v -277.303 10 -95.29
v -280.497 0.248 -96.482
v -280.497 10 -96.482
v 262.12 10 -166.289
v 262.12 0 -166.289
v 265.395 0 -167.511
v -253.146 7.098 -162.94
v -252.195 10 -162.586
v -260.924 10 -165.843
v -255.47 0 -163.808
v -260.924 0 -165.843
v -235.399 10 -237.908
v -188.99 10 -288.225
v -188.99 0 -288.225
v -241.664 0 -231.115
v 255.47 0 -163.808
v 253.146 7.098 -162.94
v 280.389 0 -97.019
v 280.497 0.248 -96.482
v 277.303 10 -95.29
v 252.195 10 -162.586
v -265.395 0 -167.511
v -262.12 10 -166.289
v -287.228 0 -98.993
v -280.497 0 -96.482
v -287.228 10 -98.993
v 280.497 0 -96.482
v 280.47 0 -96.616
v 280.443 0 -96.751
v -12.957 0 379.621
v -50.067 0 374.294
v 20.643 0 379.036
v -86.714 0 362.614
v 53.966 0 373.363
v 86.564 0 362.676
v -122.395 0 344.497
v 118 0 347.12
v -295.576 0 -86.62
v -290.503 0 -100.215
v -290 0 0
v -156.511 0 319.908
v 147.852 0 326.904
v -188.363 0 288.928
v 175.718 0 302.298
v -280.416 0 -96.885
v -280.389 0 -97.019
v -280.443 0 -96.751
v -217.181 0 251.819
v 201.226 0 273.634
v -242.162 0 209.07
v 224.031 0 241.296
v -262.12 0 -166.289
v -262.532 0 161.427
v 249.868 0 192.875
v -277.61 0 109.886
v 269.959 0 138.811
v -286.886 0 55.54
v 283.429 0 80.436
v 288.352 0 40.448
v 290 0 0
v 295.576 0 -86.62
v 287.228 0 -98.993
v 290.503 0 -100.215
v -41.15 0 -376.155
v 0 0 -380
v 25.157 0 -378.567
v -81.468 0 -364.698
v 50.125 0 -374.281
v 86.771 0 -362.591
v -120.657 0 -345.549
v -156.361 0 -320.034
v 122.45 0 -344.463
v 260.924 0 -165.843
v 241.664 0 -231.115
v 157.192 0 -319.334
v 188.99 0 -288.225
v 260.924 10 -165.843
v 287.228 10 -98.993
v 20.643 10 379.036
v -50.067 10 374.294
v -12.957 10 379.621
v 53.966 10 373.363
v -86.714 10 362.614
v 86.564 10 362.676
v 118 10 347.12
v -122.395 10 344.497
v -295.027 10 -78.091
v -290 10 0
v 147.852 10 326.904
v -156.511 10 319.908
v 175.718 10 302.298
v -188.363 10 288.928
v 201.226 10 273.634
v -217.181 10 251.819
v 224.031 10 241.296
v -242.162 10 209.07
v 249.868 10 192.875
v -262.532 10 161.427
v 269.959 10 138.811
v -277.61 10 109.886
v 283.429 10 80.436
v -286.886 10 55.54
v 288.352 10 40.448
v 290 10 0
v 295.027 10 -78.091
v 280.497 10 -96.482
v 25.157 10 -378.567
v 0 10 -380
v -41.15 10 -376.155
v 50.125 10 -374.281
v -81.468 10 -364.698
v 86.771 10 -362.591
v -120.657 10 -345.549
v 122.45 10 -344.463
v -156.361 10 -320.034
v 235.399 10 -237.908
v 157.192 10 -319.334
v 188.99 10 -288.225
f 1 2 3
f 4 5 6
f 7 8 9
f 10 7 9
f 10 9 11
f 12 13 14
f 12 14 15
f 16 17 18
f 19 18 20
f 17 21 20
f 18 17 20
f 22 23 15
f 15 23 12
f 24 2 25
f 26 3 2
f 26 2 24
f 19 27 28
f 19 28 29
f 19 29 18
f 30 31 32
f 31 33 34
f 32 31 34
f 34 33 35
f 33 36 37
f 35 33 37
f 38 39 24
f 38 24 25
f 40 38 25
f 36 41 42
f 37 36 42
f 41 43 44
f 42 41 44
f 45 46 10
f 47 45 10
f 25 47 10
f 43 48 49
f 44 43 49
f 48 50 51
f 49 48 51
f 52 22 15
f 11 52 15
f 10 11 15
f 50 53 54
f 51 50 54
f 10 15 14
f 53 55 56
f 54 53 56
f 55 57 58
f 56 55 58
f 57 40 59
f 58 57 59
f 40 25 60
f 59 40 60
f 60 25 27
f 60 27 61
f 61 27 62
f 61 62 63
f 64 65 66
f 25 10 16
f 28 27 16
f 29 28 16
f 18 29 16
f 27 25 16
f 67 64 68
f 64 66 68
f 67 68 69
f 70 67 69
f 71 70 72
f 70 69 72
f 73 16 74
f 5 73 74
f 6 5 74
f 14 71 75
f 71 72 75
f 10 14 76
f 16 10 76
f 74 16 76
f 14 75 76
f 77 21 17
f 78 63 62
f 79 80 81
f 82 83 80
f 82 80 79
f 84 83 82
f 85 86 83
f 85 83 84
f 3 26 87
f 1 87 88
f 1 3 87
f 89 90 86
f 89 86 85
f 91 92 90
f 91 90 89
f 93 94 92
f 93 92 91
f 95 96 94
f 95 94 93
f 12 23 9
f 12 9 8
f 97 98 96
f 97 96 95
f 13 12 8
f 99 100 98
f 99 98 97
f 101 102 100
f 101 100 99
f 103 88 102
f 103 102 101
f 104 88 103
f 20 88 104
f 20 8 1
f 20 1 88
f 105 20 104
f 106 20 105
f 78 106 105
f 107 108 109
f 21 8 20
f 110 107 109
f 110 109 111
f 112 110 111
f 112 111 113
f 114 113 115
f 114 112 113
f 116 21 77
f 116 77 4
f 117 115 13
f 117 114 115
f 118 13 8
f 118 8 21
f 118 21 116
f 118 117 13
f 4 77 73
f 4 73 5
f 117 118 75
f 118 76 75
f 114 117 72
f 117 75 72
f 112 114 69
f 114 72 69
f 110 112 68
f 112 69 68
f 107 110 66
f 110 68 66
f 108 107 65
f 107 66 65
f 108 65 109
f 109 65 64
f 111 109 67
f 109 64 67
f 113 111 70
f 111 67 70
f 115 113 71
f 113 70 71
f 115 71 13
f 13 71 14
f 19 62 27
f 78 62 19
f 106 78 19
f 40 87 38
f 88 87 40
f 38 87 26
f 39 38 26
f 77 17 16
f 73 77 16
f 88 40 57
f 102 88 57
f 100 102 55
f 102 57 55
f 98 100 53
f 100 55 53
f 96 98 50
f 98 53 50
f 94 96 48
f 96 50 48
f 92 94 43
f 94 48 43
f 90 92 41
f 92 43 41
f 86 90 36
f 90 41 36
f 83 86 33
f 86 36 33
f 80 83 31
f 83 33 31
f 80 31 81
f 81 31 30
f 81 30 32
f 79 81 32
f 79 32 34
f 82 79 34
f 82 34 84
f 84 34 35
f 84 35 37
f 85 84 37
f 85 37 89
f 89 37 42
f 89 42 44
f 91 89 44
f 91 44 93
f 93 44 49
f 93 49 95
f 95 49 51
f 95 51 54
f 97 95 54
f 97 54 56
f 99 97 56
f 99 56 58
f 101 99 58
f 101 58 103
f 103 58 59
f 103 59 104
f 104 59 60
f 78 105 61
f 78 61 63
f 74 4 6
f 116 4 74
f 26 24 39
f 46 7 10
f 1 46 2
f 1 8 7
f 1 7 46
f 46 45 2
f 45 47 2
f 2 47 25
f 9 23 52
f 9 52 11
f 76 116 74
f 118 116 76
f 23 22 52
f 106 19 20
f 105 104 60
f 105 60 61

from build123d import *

# Parameters (mm, degrees)
SKETCH1_RX          = 380
SKETCH1_RY          = 290
BOSS_EXTRUDE1_DEPTH = 10
BOSS_EXTRUDE2_DEPTH = 10
CUT_EXTRUDE1_DEPTH  = 10
SKETCH8_W           = 355.795250099
SKETCH8_H           = 262.515596516
CUT_EXTRUDE2_DEPTH  = 102.013832803


with BuildPart() as part:
    # Sketch1 → Boss-Extrude1 (new body)
    with BuildSketch(Plane(origin=(0, 0, 0), x_dir=(1, 0, 0), z_dir=(0, 1, 0))):
        with Locations(Location((0, 0), (0, 0, 90))):
            Ellipse(SKETCH1_RX, SKETCH1_RY)
    extrude(amount=BOSS_EXTRUDE1_DEPTH)

    # Sketch2 → Boss-Extrude2 (add)
    with BuildSketch(Plane(origin=(0, 10, 0), x_dir=(1, 0, 0), z_dir=(0, 1, 0))):
        Polygon((287.228032818, 98.993347022), (277.229646496, 95.262936552), (290, 0), (296.597160239, 102.488980208), align=None)
        Polygon((-296.597160239, 102.488980208), (-290, 0), (-277.229646496, 95.262936552), (-287.228032818, 98.993347022), align=None)
        Polygon((244.797124663, 227.718261487), (188.989530622, 288.225103524), (257.336277473, 164.50388217), (262.120047497, 166.288712763), (271.489174918, 169.784345949), (266.534927877, 209.025181731), align=None)
        Polygon((-266.534927877, 209.025181731), (-271.489174918, 169.784345949), (-262.120047497, 166.288712763), (-257.336277473, 164.50388217), (-188.989530622, 288.225103524), (-244.797124663, 227.718261487), align=None)
    extrude(amount=-BOSS_EXTRUDE2_DEPTH)

    # Sketch4 → Cut-Extrude1 (cut)
    with BuildSketch(Plane(origin=(256.485650454, 95.695117721, -95.695117721), x_dir=(-0.309165432, -0.11535001, -0.943986817), z_dir=(0.884433277, 0.329983165, -0.329983165))):
        Polygon((4.647435865, -100.404384349), (0.972491464, -70.555212825), (72.260950701, -61.778382153), (74.730936612, -81.840463395), (75.935895102, -91.627553677), align=None)
    cut_extrude1 = extrude(amount=-CUT_EXTRUDE1_DEPTH, mode=Mode.SUBTRACT)

    # Mirror1: Cut-Extrude1 across plane
    add(cut_extrude1.mirror(Plane(origin=(0, 0, 0), x_dir=(0, 0, 1), z_dir=(1, 0, 0))), mode=Mode.SUBTRACT)

    # Sketch8 → Cut-Extrude2 (cut, through all)
    with BuildSketch(Plane(origin=(256.485650454, 95.695117721, -95.695117721), x_dir=(-0.309165432, -0.11535001, -0.943986817), z_dir=(0.884433277, 0.329983165, -0.329983165))):
        with Locations((60.595009972, -108.189381189)):
            Rectangle(SKETCH8_W, SKETCH8_H)
    cut_extrude2 = extrude(amount=CUT_EXTRUDE2_DEPTH, mode=Mode.SUBTRACT)

    # Mirror2: Cut-Extrude2 across plane
    add(cut_extrude2.mirror(Plane(origin=(0, 0, 0), x_dir=(0, 0, 1), z_dir=(1, 0, 0))), mode=Mode.SUBTRACT)


solid = part.part
